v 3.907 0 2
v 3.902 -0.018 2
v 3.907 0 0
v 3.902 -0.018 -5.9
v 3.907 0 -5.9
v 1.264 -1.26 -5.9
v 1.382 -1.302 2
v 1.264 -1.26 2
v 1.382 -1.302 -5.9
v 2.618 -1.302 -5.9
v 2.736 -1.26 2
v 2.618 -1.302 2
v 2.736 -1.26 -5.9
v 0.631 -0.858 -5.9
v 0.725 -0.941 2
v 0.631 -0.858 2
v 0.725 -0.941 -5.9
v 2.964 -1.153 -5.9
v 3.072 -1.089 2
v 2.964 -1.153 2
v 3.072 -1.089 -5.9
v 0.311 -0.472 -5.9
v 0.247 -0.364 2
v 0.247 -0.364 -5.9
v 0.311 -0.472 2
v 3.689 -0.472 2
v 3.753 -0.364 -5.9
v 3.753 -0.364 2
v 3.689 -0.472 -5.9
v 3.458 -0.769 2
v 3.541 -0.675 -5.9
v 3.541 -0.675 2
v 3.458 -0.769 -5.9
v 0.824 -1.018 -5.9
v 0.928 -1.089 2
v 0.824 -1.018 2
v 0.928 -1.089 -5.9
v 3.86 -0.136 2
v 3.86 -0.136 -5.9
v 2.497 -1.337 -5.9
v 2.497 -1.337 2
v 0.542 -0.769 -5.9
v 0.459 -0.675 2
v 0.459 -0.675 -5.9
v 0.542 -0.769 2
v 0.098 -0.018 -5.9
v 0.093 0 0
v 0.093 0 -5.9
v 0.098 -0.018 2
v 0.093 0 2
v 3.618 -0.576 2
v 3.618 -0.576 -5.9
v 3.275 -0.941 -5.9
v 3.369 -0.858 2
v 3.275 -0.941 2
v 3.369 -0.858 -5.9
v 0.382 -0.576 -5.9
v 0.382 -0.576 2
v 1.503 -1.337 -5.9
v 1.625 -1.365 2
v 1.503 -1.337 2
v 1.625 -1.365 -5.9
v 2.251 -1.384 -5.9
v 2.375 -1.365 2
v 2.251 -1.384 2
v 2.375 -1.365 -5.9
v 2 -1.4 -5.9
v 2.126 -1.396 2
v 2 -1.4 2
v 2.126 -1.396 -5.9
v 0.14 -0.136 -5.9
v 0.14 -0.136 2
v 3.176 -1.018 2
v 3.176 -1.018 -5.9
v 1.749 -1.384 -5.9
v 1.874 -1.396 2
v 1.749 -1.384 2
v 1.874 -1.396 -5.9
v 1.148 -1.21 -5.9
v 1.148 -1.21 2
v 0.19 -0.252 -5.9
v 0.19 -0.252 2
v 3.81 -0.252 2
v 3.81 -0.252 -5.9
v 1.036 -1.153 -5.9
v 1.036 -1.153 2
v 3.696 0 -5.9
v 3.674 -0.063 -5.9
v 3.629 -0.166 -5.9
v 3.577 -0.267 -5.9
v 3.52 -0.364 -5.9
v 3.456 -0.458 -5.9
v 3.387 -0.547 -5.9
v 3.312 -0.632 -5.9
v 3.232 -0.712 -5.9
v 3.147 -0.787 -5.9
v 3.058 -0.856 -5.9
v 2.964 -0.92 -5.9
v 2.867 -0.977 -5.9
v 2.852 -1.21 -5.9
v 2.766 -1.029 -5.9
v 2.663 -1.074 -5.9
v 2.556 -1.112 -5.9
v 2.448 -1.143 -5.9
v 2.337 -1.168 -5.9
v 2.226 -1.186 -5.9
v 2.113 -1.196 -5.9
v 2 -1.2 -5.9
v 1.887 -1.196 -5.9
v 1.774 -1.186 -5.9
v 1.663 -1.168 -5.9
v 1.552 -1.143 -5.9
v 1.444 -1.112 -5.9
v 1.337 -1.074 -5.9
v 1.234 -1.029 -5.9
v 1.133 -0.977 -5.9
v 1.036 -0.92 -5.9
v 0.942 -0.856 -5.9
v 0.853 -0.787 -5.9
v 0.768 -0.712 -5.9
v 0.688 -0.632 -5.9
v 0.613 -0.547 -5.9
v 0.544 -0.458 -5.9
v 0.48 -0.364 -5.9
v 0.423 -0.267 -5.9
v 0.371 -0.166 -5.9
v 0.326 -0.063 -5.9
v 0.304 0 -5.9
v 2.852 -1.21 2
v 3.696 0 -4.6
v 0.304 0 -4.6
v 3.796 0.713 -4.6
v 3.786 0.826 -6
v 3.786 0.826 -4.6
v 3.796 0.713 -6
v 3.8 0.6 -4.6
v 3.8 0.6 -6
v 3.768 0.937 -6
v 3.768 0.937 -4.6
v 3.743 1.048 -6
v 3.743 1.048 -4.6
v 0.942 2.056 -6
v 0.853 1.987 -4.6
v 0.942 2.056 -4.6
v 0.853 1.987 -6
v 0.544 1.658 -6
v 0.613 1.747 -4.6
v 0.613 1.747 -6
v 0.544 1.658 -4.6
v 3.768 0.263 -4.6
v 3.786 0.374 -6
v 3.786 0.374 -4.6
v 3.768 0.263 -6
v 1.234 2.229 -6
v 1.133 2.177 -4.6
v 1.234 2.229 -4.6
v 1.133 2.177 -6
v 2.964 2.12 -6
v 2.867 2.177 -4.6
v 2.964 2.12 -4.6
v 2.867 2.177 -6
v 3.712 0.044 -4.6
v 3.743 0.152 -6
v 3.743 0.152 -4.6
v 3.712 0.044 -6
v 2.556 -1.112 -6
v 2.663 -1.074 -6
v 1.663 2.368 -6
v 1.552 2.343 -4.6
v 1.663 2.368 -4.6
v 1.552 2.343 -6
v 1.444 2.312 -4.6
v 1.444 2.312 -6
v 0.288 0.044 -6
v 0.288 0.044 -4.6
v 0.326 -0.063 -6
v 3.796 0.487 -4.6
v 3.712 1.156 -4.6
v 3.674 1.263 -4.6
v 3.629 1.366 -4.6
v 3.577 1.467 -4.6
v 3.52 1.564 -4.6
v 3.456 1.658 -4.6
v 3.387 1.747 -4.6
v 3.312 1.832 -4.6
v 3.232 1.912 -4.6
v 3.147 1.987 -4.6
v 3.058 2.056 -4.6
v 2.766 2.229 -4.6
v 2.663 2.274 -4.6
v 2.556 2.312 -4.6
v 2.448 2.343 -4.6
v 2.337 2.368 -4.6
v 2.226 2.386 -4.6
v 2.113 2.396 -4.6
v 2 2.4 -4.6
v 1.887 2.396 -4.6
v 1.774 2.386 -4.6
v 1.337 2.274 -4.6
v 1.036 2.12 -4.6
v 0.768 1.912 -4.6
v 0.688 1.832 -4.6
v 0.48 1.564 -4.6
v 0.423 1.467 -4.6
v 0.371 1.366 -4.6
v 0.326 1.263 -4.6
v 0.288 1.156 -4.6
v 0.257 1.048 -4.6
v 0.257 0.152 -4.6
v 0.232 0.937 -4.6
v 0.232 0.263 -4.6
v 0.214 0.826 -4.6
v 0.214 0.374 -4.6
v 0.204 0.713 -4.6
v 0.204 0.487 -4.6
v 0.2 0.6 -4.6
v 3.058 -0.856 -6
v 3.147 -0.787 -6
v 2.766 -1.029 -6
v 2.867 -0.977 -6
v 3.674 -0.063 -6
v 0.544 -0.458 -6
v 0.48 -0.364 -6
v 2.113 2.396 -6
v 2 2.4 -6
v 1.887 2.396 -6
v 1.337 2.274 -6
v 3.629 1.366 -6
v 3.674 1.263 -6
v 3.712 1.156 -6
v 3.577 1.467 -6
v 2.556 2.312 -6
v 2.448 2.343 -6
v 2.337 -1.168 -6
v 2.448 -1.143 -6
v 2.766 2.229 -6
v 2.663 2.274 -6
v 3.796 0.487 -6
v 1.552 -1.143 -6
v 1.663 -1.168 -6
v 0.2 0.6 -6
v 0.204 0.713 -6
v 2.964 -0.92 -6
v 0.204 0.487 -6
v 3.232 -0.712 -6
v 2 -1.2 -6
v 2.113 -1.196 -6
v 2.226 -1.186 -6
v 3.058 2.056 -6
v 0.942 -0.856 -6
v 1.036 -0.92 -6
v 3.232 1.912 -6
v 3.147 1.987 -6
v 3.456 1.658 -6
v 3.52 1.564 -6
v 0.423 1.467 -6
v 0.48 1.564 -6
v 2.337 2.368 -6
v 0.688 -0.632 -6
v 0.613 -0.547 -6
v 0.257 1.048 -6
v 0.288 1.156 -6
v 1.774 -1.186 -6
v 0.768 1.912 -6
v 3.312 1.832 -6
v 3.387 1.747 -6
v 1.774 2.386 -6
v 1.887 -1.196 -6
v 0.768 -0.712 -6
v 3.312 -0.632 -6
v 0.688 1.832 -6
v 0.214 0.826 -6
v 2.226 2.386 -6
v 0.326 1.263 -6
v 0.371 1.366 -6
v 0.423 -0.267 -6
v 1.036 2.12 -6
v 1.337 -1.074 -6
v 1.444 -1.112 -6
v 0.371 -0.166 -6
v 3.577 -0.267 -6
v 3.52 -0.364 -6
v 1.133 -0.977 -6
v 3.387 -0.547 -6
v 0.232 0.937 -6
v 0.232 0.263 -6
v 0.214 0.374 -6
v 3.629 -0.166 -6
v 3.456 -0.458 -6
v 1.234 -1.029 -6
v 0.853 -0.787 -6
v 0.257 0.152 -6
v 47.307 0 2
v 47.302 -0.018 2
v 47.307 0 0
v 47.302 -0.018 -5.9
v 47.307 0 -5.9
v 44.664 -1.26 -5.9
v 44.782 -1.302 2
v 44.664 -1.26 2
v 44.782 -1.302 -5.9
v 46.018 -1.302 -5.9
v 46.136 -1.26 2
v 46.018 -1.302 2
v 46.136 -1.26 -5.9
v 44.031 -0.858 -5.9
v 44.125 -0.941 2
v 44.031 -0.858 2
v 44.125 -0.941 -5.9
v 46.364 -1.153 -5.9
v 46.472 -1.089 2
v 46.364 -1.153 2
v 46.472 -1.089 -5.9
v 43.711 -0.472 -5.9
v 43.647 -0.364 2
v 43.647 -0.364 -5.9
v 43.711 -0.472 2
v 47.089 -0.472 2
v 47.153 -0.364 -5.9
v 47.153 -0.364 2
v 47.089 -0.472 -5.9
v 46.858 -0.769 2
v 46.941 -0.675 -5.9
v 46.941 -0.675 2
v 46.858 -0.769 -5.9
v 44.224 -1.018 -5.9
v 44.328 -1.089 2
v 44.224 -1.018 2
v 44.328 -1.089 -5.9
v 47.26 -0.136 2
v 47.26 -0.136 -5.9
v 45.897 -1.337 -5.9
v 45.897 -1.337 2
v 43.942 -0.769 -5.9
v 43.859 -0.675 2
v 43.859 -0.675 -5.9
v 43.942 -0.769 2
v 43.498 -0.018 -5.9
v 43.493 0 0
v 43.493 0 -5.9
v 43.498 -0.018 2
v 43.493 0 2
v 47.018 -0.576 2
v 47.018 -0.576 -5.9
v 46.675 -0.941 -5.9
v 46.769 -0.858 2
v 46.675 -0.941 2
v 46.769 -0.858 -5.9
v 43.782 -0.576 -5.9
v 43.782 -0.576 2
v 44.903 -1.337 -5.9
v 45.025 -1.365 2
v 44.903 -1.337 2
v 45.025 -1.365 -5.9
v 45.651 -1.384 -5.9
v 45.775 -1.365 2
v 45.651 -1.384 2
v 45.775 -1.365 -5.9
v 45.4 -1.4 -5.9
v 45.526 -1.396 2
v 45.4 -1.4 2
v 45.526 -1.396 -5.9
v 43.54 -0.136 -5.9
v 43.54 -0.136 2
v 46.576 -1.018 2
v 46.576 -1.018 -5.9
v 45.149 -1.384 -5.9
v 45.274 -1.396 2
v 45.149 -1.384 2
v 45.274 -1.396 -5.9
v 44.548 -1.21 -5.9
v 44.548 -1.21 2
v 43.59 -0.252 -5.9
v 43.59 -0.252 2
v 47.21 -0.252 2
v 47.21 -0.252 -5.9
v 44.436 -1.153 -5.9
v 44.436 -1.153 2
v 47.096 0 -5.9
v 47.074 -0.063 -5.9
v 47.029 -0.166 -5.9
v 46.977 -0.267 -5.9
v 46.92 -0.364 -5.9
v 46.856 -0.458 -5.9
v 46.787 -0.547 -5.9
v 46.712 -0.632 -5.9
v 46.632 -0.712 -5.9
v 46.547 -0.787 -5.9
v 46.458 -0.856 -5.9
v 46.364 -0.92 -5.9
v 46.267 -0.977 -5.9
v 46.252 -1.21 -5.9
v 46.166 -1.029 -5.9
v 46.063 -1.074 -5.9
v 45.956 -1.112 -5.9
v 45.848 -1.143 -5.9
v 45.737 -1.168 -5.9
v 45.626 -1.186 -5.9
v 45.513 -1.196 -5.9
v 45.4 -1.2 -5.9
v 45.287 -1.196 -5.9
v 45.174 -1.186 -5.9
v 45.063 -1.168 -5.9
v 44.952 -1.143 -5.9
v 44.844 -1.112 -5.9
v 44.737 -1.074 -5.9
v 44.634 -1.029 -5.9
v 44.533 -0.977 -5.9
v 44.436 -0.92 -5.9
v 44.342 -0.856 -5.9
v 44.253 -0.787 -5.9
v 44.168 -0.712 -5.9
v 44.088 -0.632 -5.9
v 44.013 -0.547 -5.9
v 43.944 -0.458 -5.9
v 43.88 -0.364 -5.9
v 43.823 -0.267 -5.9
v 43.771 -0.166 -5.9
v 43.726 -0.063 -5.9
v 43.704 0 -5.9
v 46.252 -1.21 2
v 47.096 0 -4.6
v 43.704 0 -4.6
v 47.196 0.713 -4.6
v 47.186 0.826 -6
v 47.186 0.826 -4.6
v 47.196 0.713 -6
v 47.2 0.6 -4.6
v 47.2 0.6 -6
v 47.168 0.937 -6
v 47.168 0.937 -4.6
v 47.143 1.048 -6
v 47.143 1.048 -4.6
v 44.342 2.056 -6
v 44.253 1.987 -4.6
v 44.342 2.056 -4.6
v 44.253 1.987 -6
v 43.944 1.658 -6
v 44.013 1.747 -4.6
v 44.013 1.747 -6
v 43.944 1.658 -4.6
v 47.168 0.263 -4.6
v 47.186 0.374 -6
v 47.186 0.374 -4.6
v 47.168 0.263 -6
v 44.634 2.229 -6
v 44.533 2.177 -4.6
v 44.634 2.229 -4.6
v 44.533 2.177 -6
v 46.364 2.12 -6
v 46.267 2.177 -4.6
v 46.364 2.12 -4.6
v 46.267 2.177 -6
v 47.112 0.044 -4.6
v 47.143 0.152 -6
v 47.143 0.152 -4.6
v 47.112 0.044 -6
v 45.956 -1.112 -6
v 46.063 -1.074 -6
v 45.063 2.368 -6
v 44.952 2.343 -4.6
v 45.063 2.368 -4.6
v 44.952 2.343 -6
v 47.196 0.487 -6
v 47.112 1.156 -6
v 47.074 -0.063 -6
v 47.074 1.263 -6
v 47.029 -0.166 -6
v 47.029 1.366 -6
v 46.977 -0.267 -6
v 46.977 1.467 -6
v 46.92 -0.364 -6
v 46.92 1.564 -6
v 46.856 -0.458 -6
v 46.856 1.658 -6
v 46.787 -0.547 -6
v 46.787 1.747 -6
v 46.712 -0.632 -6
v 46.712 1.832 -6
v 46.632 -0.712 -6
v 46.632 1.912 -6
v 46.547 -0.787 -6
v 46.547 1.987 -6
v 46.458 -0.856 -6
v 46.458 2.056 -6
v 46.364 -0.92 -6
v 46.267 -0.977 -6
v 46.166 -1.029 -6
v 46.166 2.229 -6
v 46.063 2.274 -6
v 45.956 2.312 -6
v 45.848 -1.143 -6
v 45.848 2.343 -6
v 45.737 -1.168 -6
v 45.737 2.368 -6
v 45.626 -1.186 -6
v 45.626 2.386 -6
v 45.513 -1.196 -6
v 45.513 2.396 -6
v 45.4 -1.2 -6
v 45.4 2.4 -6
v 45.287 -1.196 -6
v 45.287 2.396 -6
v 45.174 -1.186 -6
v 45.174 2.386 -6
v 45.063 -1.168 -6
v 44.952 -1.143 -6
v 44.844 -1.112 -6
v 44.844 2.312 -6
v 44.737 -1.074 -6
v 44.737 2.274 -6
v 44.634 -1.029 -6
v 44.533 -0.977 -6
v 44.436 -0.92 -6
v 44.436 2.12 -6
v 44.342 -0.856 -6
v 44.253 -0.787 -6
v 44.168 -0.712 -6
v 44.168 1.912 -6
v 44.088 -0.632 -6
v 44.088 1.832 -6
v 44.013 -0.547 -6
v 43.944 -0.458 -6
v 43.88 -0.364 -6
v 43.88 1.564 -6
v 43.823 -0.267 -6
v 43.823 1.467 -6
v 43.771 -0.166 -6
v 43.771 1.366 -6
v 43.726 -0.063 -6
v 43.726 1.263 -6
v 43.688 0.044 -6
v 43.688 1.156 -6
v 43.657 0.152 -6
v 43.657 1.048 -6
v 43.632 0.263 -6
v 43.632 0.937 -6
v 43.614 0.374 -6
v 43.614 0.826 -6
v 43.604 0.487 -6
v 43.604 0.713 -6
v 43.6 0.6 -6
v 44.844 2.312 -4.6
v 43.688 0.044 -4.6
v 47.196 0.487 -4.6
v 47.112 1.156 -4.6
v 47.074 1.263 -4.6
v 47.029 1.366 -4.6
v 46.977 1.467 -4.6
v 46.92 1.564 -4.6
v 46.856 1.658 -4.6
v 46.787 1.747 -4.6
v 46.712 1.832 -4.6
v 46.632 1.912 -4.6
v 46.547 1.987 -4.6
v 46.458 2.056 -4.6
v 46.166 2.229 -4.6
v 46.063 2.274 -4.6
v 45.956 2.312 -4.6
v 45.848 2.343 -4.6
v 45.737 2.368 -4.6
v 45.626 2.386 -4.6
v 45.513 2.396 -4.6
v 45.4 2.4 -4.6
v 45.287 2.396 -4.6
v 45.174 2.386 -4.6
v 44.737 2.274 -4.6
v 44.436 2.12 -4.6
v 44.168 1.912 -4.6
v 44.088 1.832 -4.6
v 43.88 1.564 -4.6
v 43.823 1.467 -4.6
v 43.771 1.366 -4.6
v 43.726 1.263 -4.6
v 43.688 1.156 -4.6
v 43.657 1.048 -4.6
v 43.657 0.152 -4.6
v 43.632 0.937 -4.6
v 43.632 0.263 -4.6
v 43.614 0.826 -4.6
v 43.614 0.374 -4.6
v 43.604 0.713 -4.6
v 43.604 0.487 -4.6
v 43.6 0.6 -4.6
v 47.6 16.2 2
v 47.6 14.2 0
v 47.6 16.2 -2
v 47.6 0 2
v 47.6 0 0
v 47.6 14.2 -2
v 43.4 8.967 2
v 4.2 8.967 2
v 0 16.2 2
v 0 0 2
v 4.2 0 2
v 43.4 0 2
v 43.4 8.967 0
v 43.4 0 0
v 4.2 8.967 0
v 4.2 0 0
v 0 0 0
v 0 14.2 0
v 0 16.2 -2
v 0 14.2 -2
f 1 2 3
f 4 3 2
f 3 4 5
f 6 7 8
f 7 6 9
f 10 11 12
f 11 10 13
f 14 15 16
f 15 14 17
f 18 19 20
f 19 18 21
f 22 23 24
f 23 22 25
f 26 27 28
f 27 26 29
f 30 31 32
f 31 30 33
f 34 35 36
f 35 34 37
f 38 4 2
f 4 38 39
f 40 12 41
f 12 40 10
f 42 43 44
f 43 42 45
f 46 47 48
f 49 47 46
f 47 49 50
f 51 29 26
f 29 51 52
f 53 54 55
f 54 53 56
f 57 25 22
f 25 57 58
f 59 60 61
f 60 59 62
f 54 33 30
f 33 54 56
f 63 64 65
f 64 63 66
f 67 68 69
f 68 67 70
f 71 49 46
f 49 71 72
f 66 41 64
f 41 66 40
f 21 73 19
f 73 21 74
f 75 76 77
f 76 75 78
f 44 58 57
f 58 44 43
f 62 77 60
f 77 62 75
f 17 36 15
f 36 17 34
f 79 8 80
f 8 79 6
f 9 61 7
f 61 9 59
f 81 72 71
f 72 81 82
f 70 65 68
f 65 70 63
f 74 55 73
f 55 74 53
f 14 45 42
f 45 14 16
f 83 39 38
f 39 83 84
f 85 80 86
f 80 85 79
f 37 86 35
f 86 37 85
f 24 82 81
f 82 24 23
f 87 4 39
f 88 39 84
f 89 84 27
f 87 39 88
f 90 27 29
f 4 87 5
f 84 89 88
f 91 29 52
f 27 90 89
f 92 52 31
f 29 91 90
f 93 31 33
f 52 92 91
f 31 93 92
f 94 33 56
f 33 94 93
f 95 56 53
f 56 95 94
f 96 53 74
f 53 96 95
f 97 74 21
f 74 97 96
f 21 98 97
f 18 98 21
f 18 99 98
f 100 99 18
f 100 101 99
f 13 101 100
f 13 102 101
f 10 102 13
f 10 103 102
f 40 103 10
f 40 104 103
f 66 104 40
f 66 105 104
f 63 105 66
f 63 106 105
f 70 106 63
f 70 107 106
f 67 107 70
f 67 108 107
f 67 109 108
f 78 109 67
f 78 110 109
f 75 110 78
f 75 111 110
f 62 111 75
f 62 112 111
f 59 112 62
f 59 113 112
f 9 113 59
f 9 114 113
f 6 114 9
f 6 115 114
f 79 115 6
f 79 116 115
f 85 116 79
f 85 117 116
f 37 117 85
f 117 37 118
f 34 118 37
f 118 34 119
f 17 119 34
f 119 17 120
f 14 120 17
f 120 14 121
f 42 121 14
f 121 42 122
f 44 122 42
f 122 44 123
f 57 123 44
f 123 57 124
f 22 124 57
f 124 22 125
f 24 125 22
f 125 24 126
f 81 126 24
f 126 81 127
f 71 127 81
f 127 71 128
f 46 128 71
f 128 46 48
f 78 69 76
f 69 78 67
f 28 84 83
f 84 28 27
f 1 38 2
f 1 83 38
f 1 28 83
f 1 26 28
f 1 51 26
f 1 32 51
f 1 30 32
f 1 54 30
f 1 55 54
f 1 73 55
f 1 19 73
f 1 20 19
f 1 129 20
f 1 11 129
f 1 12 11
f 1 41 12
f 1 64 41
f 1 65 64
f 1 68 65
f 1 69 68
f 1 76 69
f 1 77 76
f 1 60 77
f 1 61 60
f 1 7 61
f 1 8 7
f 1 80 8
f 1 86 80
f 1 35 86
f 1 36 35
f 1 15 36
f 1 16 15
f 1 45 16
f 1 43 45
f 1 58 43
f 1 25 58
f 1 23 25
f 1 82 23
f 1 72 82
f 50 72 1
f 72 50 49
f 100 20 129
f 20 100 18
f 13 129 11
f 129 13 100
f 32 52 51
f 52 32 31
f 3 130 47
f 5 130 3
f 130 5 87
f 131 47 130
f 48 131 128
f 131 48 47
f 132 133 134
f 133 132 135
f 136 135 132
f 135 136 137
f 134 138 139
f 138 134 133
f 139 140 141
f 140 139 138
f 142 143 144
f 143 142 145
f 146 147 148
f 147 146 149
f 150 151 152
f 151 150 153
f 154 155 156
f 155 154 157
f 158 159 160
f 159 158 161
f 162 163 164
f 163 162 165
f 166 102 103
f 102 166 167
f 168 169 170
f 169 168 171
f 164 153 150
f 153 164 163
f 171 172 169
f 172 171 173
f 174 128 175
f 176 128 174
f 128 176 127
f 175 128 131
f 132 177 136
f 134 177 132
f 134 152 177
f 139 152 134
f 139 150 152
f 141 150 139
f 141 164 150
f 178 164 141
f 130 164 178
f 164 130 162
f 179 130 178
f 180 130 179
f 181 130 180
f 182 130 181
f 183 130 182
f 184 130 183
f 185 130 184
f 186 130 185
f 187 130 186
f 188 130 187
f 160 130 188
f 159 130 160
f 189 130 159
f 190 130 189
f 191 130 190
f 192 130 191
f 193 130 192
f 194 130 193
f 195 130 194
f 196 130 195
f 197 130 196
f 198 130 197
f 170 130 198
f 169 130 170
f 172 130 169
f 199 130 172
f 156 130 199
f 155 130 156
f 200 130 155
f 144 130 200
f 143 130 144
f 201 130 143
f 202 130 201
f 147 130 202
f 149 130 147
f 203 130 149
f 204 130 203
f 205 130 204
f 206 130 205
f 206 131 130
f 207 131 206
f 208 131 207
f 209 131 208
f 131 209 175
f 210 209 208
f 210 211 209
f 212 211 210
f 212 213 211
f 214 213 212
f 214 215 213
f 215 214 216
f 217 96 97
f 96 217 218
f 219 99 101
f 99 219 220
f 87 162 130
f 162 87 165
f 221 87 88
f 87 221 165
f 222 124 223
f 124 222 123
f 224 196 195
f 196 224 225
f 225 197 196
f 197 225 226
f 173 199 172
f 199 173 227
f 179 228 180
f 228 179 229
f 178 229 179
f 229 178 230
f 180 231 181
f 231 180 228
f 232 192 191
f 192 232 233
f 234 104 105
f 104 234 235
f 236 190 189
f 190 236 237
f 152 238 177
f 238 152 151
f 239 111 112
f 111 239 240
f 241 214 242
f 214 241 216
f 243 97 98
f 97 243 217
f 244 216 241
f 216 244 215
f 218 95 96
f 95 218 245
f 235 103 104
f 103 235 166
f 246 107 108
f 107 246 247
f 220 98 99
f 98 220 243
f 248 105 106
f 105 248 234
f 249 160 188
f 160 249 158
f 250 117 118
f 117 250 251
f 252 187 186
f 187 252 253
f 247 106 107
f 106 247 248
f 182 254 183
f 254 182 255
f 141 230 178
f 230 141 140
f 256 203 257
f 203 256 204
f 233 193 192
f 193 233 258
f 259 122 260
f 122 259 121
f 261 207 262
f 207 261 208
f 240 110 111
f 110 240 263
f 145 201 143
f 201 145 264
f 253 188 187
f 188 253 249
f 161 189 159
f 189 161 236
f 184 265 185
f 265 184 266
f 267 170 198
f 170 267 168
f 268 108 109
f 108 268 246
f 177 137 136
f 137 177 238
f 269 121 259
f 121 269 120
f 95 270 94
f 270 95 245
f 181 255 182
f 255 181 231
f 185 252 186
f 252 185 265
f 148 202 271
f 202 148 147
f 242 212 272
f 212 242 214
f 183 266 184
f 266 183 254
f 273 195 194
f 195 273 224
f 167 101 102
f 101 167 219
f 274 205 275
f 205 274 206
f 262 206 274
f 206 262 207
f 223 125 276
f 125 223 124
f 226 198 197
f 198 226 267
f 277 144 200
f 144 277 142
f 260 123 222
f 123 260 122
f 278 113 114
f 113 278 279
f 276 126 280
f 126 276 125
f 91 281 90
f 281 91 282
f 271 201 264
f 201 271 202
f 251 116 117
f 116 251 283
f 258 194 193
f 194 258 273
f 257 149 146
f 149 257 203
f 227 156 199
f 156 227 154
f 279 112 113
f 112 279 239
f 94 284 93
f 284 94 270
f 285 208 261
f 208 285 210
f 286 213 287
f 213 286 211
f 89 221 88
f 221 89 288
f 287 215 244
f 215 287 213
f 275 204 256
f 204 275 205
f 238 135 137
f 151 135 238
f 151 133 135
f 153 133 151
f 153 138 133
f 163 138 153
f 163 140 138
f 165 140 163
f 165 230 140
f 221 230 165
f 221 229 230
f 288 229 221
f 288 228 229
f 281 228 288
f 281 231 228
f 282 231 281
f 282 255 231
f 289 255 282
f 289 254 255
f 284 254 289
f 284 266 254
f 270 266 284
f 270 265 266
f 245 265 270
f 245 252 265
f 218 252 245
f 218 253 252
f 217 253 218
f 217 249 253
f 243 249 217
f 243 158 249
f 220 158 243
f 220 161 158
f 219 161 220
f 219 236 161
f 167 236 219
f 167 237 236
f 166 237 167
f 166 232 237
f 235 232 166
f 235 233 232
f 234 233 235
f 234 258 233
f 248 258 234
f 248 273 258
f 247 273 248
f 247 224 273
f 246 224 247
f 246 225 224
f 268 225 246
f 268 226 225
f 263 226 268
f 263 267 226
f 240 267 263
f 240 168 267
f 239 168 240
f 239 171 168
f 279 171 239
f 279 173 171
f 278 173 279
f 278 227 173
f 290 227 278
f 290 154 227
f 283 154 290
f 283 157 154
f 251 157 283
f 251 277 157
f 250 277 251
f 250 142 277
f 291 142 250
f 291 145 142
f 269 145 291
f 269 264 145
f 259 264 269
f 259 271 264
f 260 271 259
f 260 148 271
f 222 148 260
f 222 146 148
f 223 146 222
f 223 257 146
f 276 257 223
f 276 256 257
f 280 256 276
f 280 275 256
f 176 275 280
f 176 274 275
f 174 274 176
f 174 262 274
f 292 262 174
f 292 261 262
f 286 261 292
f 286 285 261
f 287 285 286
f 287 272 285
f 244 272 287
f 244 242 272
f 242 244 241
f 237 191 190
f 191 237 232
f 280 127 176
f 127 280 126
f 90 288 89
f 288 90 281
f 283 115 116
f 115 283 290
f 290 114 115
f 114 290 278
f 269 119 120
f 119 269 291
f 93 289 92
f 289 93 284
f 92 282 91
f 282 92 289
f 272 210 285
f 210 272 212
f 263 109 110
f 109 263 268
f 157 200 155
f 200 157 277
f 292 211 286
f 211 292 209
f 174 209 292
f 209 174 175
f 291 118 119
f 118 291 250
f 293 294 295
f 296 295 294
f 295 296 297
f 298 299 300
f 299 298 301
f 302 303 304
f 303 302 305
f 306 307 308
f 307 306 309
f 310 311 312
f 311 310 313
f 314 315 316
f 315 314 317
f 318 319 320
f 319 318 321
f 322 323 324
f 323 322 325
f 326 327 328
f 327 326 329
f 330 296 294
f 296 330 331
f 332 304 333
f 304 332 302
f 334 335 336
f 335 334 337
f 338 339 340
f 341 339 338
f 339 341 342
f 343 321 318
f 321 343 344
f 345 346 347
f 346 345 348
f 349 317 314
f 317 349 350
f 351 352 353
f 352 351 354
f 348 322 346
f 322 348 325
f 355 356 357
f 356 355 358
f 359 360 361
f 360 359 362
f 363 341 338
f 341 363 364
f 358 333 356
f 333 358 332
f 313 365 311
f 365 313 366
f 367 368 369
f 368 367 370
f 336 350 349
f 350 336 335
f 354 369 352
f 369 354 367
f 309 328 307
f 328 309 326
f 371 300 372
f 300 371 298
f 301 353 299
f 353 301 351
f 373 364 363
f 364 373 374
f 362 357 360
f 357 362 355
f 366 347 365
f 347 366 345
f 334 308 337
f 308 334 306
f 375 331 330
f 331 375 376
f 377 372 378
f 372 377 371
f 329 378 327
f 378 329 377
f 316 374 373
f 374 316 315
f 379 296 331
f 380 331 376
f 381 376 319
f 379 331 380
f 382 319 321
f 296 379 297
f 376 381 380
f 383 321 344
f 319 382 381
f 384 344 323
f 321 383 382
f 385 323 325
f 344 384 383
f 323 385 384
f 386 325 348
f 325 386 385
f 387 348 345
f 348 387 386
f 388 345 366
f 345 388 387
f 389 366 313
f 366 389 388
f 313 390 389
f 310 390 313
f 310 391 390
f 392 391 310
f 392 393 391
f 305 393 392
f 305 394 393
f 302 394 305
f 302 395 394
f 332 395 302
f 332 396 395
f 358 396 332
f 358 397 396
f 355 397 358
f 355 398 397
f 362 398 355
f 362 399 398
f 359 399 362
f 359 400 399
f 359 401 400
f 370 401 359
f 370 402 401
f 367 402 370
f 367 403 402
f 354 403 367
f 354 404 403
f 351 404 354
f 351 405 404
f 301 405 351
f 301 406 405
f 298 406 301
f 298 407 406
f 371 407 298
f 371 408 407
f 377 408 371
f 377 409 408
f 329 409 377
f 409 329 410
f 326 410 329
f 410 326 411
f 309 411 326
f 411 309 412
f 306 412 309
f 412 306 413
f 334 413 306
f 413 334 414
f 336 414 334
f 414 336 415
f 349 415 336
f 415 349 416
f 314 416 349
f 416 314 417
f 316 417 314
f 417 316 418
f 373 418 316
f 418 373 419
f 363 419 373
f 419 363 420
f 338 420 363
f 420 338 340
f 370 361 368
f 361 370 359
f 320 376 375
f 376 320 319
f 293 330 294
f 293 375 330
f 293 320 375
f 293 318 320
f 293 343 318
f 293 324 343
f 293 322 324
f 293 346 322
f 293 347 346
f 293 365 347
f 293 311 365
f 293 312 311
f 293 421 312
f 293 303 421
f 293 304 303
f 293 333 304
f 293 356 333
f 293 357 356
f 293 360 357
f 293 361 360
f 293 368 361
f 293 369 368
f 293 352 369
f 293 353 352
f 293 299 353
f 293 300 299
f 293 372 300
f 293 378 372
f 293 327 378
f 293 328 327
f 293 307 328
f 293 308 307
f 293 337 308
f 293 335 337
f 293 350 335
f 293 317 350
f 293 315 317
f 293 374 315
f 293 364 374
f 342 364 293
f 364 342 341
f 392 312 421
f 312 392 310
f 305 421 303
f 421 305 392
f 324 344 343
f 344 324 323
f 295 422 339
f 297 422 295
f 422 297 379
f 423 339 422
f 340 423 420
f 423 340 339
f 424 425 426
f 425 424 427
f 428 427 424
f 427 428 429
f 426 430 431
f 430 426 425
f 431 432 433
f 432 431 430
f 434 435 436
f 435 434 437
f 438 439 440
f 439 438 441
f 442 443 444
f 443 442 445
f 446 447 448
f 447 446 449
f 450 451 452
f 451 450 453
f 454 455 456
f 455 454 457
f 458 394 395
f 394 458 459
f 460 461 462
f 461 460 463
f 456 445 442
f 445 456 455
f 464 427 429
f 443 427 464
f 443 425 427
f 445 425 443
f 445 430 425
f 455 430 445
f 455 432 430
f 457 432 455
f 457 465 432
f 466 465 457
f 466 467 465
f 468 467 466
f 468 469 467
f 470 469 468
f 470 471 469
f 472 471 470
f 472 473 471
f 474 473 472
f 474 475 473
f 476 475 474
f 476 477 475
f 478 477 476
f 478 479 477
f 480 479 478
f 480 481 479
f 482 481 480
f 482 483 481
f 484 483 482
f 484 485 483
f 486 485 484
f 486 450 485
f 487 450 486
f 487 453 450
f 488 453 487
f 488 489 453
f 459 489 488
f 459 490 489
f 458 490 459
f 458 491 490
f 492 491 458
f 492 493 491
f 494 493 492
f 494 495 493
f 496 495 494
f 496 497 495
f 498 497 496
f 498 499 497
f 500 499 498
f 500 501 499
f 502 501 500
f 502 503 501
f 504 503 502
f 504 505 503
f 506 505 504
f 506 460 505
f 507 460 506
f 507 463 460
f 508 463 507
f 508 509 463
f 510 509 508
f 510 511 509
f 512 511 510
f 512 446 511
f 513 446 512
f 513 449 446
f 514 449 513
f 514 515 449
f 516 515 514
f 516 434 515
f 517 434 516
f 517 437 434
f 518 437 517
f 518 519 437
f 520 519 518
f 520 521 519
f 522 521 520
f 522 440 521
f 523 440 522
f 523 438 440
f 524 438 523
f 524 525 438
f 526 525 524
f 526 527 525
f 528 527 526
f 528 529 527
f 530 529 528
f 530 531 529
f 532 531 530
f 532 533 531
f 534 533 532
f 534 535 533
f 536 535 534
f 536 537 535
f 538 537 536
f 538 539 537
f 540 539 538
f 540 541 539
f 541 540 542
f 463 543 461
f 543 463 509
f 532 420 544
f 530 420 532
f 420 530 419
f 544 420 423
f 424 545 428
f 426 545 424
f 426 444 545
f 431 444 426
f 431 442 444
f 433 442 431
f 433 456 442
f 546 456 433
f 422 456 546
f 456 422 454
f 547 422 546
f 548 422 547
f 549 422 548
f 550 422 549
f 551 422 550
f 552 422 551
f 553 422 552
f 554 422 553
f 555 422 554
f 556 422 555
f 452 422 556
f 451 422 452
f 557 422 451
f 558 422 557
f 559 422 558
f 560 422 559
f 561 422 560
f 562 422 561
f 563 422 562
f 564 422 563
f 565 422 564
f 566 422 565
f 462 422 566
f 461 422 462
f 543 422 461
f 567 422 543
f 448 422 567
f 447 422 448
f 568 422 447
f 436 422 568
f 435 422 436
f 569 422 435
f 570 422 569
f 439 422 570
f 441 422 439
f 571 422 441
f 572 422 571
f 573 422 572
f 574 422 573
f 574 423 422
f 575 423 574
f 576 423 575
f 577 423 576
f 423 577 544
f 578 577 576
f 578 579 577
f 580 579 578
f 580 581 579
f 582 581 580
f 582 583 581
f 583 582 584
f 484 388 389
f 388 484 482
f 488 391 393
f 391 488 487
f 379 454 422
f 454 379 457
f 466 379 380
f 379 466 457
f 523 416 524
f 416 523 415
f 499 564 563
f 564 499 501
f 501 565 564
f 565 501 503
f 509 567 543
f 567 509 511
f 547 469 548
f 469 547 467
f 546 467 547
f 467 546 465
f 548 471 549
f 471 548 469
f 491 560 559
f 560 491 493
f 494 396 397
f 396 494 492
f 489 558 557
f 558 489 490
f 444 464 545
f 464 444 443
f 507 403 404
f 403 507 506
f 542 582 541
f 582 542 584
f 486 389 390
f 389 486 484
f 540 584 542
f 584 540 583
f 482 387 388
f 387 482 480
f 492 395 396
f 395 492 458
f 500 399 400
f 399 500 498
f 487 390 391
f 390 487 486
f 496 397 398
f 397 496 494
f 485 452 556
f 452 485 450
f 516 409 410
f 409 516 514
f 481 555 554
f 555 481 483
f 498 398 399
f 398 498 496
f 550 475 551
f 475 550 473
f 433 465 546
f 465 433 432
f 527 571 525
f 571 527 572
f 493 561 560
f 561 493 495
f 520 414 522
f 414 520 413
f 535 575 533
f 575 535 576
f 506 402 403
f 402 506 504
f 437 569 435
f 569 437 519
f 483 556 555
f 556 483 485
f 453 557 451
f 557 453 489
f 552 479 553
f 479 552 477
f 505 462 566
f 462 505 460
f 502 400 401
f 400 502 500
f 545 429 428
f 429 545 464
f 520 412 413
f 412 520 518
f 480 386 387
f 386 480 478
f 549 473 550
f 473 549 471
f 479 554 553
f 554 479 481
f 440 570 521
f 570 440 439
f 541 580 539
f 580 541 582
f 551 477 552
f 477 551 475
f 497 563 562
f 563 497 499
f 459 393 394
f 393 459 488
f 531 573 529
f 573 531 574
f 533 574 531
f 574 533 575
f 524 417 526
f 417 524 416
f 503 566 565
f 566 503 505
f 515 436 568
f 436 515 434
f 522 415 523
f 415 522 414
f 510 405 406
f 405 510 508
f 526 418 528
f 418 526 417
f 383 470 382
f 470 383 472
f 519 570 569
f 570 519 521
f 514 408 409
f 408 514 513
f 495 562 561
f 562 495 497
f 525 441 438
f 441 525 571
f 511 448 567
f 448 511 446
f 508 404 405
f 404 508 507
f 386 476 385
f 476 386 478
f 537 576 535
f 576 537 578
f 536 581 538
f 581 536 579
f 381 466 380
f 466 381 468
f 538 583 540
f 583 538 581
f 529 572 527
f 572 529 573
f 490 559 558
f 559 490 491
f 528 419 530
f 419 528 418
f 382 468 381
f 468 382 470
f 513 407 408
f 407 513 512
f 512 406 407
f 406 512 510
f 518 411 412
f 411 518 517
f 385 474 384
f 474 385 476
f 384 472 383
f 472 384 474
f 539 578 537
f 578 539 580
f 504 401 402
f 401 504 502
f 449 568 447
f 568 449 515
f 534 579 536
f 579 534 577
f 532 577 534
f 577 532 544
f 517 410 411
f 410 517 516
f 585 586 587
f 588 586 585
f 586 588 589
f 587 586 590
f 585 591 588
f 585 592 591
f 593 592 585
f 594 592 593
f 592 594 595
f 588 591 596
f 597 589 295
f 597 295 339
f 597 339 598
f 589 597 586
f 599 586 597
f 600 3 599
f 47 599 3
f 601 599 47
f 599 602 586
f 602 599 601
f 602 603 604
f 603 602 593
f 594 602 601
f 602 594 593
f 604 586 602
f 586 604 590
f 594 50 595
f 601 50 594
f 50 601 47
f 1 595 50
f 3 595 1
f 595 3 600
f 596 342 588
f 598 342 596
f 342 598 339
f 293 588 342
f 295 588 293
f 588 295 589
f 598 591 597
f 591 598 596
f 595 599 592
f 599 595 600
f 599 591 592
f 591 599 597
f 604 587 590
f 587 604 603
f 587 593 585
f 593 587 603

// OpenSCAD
/* Edge connector retainer for micro:bit expansion boards.
e.g. https://www.sparkfun.com/products/13988
 To stop the micro:bit from pulling out easily from the board.
 Designed to be used inside of cases, which keep the expansion board press fit against the connector and micro:bit.
 The 4mm holes on the micro:bit are half-exposed in the connector.
 The retainer plugs into these.
 Dimensions: mm
matthew oppenheim july 2021
*/
// make spheres and cylinders render smooth
$fn=100;
delta=0.2;
mbit_hole_dia = 4.0;
mbit_hole_exposure = 2.0;
//mbit_hole_spacing_x = 22.5+delta;
mbit_hole_spacing_x = 43.2+delta;
// effective hole diameter is a bit smaller for clearance
eff_hole_dia = mbit_hole_dia-delta;
connector_z_front = 3.5;
connector_z_rear = 2.0;
connector_y = 13.8;
wall = 2.0;
pcb_thickness = 1.4;
// depth below top plate that the plugs extend
total_plug_z = pcb_thickness+connector_z_front+wall+5*delta;
ret_total_x = mbit_hole_spacing_x+eff_hole_dia+2*delta;
top_plate_x = mbit_hole_spacing_x+eff_hole_dia+2*delta;
top_plate_y = connector_y + 2*delta;

module mbit_hole_plug(){
    // plug to fit into micro:bit 4mm hole
    r = mbit_hole_dia/2-delta;
    height = pcb_thickness;
    cylinder(r1=r, r2=r, h=height);
}

module mbit_hole_plug_support(){
    // support to join plug to top plate
    r = mbit_hole_dia/2;
    height = total_plug_z;
    rotate([0, 0, 90])
    translate([delta, 0 , wall])
    difference(){
        cylinder(r1=r, r2=r, h=height);
        translate([-3*delta,-r,-delta])
        cube([2*r, 2*r, height+2*delta]);
    }
}

module mbit_hole_plug_assembly(){
    // plug added to the end of the support
    mbit_hole_plug_support();
    translate([0, delta, 1.5*pcb_thickness-delta])
    mbit_hole_plug();
}

module plugs(){
    // plugs that go into exposed micro:bit hole semi-circles
    //translate([mbit_hole_dia/2, eff_hole_dia/2, -total_plug_z]){
    translate([mbit_hole_dia/2, 2*delta, -total_plug_z]){
    mbit_hole_plug_assembly();
    translate([mbit_hole_spacing_x, 0, 0])
    mbit_hole_plug_assembly();
    }
}


module top_cut_out(){
    // cut out front edge of top plate
    color([0, 1, 1])
    translate([eff_hole_dia+2*delta, -2.5*delta, -delta])
    cube([top_plate_x-2*eff_hole_dia-4*delta, 2*top_plate_y/3, wall+2*delta]);
}

module top_plate(){
    // The top plate goes across the top of the edge connector.
    difference(){
        cube([top_plate_x, top_plate_y, wall]);
        top_cut_out();
    }
}

module rear_plate(){
    // The rear plate clips over the rear of the edge connector.
    translate([0, top_plate_y, -connector_z_rear])
    cube([ret_total_x, wall, wall+connector_z_rear]);
}

module assembly(){
    color([0, 1, 0, 0.2]){
    union()
        plugs();
        top_plate();
    }
}

assembly();
rear_plate();
